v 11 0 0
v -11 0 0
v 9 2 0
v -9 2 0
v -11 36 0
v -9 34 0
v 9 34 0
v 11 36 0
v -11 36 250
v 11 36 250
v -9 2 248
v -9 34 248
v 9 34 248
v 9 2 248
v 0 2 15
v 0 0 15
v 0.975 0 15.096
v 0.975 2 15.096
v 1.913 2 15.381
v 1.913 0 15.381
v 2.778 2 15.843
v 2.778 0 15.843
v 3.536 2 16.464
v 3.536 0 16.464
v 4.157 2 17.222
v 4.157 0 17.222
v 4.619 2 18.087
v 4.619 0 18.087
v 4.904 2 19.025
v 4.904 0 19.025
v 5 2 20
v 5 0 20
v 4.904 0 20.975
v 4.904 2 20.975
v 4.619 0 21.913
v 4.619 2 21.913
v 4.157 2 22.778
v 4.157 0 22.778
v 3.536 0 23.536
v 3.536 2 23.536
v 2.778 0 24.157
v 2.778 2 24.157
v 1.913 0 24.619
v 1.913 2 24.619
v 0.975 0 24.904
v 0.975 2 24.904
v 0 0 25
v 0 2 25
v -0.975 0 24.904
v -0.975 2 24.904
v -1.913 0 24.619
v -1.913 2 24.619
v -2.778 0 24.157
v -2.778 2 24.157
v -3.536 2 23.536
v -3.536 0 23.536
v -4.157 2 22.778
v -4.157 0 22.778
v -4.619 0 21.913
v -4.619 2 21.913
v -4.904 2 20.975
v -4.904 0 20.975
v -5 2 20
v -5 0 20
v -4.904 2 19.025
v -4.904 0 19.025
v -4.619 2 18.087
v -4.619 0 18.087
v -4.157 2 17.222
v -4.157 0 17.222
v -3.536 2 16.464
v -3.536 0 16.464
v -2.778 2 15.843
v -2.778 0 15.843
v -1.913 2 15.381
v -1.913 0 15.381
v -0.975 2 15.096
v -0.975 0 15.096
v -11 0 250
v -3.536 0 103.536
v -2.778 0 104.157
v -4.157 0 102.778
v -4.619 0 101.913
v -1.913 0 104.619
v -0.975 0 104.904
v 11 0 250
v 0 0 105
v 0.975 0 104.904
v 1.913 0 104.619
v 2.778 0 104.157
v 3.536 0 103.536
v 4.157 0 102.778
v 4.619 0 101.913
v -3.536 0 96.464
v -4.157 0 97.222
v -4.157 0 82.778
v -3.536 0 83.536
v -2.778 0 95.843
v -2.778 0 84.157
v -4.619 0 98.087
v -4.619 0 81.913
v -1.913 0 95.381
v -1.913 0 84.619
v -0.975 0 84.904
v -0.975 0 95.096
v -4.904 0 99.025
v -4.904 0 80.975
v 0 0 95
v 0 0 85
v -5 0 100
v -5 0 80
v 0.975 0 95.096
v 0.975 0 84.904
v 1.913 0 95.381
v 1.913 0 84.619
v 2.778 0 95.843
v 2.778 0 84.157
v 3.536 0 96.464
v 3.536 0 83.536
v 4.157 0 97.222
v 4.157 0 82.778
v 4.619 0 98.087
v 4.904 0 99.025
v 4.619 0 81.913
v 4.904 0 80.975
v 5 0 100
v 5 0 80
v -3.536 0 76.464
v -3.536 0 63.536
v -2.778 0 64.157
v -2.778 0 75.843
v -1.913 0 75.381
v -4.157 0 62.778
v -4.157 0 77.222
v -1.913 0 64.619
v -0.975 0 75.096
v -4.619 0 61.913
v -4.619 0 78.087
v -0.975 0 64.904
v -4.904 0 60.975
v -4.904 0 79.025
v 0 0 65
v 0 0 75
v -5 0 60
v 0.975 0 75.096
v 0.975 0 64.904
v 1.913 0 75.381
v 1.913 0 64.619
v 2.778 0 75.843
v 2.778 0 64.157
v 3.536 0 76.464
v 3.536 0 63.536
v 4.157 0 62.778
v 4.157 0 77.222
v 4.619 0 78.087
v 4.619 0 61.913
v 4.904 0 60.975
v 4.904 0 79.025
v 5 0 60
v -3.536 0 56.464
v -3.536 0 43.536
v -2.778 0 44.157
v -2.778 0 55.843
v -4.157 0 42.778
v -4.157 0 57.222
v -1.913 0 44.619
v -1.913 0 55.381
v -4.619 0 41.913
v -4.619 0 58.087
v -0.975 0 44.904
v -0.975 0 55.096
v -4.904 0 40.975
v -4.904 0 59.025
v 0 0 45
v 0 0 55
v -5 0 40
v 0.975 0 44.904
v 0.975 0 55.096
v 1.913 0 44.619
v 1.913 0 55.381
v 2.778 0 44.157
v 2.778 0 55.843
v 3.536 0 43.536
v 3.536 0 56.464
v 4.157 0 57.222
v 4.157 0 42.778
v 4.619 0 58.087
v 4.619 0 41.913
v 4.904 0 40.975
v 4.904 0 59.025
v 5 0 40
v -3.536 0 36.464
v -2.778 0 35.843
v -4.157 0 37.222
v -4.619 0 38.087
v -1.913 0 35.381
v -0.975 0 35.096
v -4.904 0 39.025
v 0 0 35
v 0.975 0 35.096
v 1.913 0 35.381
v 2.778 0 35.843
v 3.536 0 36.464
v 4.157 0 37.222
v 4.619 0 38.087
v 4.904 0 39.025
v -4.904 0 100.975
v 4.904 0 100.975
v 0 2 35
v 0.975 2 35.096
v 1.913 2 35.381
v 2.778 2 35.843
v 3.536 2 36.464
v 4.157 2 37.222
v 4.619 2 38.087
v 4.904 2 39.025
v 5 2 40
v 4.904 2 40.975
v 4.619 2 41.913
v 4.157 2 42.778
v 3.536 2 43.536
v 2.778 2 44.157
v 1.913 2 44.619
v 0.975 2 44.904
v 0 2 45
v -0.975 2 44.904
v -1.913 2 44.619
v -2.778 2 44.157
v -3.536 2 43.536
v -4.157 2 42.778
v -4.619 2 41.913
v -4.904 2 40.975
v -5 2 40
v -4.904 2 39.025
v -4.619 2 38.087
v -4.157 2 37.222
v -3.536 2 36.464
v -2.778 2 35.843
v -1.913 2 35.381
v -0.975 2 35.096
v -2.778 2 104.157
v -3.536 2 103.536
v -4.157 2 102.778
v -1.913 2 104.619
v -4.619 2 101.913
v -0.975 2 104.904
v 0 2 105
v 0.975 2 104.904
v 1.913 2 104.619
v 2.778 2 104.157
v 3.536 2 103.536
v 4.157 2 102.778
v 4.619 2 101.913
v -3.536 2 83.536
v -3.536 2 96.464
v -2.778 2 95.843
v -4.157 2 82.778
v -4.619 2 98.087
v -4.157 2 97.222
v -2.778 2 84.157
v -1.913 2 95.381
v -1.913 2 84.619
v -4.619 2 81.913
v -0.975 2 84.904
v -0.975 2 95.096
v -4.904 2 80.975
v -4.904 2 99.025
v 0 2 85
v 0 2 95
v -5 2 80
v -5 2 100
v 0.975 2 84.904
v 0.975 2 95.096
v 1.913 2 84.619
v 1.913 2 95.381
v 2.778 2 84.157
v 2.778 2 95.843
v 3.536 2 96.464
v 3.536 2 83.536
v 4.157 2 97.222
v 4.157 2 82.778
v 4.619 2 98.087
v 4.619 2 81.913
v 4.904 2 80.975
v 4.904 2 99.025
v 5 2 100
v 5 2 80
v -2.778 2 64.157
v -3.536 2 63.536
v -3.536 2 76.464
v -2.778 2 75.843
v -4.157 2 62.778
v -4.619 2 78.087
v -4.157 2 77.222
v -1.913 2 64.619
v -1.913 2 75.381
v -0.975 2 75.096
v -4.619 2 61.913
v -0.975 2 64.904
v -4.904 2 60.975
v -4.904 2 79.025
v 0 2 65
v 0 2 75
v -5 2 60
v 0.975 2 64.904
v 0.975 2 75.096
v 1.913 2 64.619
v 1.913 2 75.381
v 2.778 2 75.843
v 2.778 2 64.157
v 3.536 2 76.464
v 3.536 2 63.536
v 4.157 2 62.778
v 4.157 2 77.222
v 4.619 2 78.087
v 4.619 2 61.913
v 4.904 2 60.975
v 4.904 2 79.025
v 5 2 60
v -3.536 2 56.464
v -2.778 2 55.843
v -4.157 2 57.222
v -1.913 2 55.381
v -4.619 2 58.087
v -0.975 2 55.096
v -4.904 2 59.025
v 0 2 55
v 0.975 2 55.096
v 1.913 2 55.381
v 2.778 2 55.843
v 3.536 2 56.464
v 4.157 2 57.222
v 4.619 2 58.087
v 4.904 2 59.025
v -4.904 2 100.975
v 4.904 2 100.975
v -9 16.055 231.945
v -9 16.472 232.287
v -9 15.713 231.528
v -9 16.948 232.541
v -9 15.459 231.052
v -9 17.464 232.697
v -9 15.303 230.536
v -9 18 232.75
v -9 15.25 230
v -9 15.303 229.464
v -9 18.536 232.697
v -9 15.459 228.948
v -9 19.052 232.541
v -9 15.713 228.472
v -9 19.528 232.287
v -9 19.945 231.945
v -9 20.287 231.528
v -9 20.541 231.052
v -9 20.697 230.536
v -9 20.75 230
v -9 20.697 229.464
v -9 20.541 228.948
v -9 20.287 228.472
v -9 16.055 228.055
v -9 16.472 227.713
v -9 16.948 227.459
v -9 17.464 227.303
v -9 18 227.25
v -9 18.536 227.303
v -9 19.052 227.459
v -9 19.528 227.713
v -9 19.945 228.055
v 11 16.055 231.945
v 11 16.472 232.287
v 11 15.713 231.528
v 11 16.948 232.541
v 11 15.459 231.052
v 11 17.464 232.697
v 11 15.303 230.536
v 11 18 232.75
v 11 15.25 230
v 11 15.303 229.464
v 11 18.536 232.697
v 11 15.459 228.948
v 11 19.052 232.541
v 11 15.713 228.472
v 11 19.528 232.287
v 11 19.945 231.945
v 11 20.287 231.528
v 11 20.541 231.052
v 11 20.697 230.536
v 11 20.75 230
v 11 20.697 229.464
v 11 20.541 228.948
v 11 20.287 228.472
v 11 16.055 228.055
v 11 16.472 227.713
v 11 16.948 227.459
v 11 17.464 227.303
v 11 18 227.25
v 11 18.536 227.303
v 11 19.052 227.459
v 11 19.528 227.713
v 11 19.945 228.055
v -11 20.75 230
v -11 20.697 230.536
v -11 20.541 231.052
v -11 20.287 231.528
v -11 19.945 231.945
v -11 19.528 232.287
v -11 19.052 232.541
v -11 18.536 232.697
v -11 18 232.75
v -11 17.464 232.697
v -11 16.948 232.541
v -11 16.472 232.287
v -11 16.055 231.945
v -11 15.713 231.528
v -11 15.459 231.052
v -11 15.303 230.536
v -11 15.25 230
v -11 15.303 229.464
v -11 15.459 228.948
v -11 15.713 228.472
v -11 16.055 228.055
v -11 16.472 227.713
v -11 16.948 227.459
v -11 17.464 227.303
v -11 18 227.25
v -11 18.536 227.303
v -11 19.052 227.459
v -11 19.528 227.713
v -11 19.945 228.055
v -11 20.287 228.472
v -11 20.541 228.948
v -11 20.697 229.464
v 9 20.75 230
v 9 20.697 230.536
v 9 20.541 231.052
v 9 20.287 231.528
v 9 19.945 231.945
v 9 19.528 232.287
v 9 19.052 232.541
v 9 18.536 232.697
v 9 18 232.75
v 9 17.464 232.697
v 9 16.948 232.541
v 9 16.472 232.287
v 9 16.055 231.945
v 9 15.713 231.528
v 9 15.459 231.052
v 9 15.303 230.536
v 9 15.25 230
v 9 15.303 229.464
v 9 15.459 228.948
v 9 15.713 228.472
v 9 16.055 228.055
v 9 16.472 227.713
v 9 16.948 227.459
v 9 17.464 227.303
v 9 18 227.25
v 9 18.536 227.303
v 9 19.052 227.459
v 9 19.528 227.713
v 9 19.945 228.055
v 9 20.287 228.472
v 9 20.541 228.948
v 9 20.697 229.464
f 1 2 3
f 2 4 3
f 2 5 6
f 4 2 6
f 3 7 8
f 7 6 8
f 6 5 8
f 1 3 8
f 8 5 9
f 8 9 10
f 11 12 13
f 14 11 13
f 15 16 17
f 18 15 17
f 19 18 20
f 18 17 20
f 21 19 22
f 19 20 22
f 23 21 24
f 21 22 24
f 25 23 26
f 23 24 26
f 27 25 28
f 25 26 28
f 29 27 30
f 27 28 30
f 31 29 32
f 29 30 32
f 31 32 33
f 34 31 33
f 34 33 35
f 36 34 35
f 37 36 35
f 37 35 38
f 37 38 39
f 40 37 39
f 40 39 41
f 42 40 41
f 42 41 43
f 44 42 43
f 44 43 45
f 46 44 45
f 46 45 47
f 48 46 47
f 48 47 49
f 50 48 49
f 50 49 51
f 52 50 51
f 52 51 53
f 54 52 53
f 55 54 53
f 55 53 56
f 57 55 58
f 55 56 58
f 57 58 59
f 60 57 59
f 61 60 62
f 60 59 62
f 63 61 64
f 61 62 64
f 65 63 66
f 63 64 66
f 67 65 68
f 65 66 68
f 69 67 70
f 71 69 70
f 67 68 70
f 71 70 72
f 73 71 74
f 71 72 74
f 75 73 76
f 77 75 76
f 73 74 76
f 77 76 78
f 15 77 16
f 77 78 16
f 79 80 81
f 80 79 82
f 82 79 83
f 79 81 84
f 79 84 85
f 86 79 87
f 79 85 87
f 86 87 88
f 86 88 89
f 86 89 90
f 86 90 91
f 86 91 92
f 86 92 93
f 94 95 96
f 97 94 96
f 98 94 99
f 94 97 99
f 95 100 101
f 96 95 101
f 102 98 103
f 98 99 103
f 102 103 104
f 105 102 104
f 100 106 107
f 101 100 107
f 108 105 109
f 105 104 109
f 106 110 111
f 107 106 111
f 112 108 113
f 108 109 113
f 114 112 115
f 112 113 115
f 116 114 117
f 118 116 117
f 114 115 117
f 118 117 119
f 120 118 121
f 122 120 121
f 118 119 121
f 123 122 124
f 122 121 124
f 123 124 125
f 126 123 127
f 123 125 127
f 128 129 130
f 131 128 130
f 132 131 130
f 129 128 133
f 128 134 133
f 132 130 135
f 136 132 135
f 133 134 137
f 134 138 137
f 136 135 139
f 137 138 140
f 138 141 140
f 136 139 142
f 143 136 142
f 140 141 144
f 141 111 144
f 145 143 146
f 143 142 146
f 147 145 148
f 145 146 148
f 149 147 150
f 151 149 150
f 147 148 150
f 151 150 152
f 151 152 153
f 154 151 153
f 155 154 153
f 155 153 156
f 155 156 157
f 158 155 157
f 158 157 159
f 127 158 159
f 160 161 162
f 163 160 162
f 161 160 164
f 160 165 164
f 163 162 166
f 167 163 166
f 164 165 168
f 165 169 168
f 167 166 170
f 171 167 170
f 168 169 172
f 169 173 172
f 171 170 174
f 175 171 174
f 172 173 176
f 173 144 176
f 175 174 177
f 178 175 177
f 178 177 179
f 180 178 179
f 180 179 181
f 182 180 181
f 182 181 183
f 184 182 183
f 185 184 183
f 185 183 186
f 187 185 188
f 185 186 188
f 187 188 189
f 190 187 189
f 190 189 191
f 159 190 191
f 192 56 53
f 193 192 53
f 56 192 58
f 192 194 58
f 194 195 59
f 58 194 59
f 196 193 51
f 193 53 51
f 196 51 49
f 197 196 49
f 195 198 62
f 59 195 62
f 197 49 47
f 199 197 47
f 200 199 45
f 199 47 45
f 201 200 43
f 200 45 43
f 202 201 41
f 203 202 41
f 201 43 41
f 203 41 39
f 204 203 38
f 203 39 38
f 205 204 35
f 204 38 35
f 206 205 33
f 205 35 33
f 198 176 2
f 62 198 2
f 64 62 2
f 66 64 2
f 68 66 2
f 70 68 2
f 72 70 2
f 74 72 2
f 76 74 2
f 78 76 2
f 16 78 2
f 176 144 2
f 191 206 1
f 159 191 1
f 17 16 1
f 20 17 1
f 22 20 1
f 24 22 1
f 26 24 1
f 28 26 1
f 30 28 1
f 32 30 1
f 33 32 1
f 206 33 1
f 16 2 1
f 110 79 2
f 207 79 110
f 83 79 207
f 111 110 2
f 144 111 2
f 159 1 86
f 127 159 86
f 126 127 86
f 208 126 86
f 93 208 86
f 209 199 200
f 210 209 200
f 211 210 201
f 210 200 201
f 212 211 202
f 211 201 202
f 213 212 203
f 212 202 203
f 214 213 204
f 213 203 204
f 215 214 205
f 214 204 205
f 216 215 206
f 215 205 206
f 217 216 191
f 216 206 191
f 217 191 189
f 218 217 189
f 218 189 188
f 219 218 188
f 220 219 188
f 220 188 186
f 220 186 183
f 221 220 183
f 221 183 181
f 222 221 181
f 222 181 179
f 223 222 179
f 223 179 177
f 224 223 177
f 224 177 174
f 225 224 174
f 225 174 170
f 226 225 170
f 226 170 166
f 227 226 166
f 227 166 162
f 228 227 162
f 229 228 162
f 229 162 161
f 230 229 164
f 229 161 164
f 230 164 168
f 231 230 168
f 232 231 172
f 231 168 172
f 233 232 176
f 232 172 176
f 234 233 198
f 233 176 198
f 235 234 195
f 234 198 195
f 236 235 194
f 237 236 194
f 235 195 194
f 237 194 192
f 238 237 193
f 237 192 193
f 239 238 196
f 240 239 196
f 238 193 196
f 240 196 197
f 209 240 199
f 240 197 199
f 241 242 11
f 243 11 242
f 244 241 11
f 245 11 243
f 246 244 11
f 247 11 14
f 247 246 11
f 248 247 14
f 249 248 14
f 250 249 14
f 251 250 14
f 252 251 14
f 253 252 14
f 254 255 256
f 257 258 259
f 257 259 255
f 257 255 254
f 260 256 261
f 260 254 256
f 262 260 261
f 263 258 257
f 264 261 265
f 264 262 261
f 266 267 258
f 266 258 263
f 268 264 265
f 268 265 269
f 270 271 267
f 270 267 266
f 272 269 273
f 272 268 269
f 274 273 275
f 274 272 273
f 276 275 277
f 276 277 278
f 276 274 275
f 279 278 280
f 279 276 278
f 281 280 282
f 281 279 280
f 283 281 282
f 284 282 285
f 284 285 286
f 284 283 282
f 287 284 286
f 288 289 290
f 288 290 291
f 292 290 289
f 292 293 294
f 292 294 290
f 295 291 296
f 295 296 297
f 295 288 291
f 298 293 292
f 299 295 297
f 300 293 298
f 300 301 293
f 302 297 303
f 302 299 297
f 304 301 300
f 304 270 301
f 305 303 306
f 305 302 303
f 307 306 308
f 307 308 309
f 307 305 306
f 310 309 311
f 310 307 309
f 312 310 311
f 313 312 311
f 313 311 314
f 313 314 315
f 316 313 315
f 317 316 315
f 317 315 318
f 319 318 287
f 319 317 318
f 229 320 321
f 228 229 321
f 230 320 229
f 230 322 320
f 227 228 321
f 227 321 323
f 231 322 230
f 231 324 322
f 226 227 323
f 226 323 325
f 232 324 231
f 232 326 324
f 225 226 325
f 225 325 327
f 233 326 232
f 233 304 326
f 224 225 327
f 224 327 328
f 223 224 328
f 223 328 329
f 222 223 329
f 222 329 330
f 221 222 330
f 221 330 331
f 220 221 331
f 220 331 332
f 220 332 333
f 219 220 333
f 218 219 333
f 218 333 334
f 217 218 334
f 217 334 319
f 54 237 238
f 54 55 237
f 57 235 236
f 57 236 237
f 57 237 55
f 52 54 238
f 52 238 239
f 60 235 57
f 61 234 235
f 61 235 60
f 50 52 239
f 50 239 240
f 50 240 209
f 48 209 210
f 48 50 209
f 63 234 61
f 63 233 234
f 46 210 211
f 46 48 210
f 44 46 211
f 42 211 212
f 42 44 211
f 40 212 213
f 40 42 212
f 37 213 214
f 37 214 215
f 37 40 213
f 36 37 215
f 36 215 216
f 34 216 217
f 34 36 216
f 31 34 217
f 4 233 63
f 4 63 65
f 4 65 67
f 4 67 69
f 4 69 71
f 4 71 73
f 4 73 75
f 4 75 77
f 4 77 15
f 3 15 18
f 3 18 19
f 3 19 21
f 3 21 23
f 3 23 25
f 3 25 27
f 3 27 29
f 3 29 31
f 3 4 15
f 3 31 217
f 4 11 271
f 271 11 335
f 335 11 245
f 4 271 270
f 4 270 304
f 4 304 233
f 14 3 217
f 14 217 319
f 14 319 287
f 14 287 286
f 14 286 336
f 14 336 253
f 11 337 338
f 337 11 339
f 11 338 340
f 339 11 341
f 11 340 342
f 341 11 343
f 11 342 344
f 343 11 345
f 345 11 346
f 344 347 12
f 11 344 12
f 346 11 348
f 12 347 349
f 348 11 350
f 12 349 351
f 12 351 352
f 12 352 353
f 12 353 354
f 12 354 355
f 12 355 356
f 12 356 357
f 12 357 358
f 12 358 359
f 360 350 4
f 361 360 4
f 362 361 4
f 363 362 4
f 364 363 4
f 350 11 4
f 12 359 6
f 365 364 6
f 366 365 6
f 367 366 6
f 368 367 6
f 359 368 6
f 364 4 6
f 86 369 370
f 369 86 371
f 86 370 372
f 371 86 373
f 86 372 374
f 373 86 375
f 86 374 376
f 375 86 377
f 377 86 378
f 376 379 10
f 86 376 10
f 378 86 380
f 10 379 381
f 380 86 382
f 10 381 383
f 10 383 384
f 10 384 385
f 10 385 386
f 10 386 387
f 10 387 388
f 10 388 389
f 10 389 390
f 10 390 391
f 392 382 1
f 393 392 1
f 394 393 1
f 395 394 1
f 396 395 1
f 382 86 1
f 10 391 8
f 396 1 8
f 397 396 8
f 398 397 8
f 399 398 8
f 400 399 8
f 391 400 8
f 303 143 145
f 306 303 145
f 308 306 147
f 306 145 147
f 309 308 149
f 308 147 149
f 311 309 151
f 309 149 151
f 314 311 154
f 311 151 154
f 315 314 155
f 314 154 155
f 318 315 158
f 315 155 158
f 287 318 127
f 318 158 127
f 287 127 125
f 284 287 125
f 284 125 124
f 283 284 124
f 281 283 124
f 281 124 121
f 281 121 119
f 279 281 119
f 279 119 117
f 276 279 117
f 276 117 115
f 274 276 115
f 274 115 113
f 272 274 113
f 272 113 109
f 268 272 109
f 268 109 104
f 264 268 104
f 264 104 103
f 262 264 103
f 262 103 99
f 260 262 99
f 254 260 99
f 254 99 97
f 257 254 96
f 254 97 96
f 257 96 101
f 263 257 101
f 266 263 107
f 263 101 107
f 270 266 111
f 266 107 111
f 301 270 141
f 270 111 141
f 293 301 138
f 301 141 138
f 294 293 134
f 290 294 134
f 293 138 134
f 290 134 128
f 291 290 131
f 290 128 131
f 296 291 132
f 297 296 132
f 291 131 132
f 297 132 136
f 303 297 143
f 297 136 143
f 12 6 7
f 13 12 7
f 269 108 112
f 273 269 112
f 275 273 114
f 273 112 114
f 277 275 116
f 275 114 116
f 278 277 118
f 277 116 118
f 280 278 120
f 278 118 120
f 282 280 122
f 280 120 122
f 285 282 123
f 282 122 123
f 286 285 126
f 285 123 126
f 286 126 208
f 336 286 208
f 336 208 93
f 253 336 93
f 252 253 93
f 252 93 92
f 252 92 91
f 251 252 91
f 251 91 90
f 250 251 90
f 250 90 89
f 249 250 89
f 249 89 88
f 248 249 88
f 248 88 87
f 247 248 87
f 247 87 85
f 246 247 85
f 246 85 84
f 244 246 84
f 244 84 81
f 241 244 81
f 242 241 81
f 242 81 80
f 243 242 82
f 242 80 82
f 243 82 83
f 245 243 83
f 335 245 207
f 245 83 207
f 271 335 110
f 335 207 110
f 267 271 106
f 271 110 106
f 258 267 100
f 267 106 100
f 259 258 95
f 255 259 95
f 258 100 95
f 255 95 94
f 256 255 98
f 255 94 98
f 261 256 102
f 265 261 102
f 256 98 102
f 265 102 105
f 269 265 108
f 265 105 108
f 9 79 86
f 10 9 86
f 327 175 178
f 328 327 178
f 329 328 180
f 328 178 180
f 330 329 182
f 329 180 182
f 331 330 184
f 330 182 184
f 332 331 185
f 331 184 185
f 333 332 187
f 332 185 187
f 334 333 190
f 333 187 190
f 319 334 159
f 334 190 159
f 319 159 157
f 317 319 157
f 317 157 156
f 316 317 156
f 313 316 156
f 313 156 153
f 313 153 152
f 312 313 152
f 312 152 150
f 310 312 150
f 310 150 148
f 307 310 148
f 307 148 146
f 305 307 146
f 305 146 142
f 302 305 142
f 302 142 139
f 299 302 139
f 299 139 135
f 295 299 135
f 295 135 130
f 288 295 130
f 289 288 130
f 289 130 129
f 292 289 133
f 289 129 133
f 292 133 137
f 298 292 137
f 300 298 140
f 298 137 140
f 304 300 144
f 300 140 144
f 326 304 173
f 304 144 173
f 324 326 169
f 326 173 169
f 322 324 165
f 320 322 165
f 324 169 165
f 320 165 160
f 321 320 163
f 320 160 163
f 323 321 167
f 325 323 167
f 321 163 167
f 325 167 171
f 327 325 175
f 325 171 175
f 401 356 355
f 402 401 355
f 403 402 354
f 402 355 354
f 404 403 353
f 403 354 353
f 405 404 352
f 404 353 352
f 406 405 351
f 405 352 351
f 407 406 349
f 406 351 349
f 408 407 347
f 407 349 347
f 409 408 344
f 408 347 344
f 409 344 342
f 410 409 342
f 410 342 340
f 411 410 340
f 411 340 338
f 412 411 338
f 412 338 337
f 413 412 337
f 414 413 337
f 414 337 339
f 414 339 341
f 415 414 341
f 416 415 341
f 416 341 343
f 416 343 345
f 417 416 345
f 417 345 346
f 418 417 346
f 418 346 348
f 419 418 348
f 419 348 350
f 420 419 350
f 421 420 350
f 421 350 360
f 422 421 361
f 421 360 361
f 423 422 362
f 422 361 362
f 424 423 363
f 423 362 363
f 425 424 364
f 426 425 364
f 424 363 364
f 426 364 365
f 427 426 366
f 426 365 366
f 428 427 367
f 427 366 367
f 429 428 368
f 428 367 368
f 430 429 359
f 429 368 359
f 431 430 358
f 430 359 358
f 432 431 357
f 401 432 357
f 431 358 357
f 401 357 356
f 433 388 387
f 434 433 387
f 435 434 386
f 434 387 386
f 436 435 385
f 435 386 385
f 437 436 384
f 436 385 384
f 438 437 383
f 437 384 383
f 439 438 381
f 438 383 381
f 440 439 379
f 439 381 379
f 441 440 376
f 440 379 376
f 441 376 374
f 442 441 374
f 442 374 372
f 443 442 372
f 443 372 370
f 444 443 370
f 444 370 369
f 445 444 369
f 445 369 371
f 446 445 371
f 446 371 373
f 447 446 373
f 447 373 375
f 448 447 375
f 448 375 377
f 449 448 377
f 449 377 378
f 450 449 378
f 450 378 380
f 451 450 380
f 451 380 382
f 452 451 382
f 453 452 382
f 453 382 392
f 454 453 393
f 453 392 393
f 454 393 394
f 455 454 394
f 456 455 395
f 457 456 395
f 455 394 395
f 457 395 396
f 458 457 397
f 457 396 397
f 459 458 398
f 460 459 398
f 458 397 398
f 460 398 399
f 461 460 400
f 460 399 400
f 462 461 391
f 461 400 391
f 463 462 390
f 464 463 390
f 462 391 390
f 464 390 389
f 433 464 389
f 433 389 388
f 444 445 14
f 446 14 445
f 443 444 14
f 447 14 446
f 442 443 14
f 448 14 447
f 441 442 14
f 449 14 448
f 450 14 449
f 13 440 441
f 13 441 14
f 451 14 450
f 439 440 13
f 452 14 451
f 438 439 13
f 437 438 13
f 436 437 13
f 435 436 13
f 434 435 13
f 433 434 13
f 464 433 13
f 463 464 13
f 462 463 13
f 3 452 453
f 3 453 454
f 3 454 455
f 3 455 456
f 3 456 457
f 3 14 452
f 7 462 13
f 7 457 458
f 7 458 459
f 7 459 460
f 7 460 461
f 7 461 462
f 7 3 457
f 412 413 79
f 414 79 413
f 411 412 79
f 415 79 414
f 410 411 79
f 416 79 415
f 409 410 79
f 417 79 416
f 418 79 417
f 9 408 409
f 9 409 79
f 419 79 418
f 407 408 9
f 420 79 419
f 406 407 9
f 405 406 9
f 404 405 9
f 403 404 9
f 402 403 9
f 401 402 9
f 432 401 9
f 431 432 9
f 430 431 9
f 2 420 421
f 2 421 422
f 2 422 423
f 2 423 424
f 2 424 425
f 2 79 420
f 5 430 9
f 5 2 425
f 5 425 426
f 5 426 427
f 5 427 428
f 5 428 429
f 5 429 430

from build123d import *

# Parameters (mm, degrees)
ESBO_O1_W                = 22
ESBO_O1_H                = 36
RESSALTO_EXTRUS_O1_DEPTH = 250
CASCA1_T                 = -2
ESBO_O2_R                = 5
CORTE_EXTRUS_O1_DEPTH    = 10
ESBO_O3_R                = 2.75
CORTE_EXTRUS_O2_DEPTH    = 29


with BuildPart() as part:
    # Esboço1 → Ressalto-extrusão1 (new body)
    with BuildSketch(Plane.XY):
        with Locations((0, 18)):
            Rectangle(ESBO_O1_W, ESBO_O1_H)
    extrude(amount=RESSALTO_EXTRUS_O1_DEPTH)

    # Casca1
    casca1_openings = [part.faces().sort_by_distance(p)[0] for p in [
        (0, 18, 0),
    ]]
    offset(amount=CASCA1_T, openings=casca1_openings, kind=Kind.INTERSECTION)

    # Esboço2 → Corte-extrusão1 (cut)
    with BuildSketch(Plane(origin=(0, 0, 0), x_dir=(-1, 0, 0), z_dir=(0, -1, 0))):
        with Locations(Location((0, -20, 0), (0, 0, 90))):
            Circle(ESBO_O2_R)
        with Locations(Location((0, -40, 0), (0, 0, 90))):
            Circle(ESBO_O2_R)
        with Locations(Location((0, -60, 0), (0, 0, 90))):
            Circle(ESBO_O2_R)
        with Locations(Location((0, -80, 0), (0, 0, 90))):
            Circle(ESBO_O2_R)
        with Locations(Location((0, -100, 0), (0, 0, 90))):
            Circle(ESBO_O2_R)
    extrude(amount=-CORTE_EXTRUS_O1_DEPTH, mode=Mode.SUBTRACT)

    # Esboço3 → Corte-extrusão2 (cut)
    with BuildSketch(Plane(origin=(11, 0, 0), x_dir=(0, 0, -1), z_dir=(1, 0, 0))):
        with Locations(Location((-230, 18, 0), (0, 0, 90))):
            Circle(ESBO_O3_R)
    extrude(amount=-CORTE_EXTRUS_O2_DEPTH, mode=Mode.SUBTRACT)


solid = part.part
